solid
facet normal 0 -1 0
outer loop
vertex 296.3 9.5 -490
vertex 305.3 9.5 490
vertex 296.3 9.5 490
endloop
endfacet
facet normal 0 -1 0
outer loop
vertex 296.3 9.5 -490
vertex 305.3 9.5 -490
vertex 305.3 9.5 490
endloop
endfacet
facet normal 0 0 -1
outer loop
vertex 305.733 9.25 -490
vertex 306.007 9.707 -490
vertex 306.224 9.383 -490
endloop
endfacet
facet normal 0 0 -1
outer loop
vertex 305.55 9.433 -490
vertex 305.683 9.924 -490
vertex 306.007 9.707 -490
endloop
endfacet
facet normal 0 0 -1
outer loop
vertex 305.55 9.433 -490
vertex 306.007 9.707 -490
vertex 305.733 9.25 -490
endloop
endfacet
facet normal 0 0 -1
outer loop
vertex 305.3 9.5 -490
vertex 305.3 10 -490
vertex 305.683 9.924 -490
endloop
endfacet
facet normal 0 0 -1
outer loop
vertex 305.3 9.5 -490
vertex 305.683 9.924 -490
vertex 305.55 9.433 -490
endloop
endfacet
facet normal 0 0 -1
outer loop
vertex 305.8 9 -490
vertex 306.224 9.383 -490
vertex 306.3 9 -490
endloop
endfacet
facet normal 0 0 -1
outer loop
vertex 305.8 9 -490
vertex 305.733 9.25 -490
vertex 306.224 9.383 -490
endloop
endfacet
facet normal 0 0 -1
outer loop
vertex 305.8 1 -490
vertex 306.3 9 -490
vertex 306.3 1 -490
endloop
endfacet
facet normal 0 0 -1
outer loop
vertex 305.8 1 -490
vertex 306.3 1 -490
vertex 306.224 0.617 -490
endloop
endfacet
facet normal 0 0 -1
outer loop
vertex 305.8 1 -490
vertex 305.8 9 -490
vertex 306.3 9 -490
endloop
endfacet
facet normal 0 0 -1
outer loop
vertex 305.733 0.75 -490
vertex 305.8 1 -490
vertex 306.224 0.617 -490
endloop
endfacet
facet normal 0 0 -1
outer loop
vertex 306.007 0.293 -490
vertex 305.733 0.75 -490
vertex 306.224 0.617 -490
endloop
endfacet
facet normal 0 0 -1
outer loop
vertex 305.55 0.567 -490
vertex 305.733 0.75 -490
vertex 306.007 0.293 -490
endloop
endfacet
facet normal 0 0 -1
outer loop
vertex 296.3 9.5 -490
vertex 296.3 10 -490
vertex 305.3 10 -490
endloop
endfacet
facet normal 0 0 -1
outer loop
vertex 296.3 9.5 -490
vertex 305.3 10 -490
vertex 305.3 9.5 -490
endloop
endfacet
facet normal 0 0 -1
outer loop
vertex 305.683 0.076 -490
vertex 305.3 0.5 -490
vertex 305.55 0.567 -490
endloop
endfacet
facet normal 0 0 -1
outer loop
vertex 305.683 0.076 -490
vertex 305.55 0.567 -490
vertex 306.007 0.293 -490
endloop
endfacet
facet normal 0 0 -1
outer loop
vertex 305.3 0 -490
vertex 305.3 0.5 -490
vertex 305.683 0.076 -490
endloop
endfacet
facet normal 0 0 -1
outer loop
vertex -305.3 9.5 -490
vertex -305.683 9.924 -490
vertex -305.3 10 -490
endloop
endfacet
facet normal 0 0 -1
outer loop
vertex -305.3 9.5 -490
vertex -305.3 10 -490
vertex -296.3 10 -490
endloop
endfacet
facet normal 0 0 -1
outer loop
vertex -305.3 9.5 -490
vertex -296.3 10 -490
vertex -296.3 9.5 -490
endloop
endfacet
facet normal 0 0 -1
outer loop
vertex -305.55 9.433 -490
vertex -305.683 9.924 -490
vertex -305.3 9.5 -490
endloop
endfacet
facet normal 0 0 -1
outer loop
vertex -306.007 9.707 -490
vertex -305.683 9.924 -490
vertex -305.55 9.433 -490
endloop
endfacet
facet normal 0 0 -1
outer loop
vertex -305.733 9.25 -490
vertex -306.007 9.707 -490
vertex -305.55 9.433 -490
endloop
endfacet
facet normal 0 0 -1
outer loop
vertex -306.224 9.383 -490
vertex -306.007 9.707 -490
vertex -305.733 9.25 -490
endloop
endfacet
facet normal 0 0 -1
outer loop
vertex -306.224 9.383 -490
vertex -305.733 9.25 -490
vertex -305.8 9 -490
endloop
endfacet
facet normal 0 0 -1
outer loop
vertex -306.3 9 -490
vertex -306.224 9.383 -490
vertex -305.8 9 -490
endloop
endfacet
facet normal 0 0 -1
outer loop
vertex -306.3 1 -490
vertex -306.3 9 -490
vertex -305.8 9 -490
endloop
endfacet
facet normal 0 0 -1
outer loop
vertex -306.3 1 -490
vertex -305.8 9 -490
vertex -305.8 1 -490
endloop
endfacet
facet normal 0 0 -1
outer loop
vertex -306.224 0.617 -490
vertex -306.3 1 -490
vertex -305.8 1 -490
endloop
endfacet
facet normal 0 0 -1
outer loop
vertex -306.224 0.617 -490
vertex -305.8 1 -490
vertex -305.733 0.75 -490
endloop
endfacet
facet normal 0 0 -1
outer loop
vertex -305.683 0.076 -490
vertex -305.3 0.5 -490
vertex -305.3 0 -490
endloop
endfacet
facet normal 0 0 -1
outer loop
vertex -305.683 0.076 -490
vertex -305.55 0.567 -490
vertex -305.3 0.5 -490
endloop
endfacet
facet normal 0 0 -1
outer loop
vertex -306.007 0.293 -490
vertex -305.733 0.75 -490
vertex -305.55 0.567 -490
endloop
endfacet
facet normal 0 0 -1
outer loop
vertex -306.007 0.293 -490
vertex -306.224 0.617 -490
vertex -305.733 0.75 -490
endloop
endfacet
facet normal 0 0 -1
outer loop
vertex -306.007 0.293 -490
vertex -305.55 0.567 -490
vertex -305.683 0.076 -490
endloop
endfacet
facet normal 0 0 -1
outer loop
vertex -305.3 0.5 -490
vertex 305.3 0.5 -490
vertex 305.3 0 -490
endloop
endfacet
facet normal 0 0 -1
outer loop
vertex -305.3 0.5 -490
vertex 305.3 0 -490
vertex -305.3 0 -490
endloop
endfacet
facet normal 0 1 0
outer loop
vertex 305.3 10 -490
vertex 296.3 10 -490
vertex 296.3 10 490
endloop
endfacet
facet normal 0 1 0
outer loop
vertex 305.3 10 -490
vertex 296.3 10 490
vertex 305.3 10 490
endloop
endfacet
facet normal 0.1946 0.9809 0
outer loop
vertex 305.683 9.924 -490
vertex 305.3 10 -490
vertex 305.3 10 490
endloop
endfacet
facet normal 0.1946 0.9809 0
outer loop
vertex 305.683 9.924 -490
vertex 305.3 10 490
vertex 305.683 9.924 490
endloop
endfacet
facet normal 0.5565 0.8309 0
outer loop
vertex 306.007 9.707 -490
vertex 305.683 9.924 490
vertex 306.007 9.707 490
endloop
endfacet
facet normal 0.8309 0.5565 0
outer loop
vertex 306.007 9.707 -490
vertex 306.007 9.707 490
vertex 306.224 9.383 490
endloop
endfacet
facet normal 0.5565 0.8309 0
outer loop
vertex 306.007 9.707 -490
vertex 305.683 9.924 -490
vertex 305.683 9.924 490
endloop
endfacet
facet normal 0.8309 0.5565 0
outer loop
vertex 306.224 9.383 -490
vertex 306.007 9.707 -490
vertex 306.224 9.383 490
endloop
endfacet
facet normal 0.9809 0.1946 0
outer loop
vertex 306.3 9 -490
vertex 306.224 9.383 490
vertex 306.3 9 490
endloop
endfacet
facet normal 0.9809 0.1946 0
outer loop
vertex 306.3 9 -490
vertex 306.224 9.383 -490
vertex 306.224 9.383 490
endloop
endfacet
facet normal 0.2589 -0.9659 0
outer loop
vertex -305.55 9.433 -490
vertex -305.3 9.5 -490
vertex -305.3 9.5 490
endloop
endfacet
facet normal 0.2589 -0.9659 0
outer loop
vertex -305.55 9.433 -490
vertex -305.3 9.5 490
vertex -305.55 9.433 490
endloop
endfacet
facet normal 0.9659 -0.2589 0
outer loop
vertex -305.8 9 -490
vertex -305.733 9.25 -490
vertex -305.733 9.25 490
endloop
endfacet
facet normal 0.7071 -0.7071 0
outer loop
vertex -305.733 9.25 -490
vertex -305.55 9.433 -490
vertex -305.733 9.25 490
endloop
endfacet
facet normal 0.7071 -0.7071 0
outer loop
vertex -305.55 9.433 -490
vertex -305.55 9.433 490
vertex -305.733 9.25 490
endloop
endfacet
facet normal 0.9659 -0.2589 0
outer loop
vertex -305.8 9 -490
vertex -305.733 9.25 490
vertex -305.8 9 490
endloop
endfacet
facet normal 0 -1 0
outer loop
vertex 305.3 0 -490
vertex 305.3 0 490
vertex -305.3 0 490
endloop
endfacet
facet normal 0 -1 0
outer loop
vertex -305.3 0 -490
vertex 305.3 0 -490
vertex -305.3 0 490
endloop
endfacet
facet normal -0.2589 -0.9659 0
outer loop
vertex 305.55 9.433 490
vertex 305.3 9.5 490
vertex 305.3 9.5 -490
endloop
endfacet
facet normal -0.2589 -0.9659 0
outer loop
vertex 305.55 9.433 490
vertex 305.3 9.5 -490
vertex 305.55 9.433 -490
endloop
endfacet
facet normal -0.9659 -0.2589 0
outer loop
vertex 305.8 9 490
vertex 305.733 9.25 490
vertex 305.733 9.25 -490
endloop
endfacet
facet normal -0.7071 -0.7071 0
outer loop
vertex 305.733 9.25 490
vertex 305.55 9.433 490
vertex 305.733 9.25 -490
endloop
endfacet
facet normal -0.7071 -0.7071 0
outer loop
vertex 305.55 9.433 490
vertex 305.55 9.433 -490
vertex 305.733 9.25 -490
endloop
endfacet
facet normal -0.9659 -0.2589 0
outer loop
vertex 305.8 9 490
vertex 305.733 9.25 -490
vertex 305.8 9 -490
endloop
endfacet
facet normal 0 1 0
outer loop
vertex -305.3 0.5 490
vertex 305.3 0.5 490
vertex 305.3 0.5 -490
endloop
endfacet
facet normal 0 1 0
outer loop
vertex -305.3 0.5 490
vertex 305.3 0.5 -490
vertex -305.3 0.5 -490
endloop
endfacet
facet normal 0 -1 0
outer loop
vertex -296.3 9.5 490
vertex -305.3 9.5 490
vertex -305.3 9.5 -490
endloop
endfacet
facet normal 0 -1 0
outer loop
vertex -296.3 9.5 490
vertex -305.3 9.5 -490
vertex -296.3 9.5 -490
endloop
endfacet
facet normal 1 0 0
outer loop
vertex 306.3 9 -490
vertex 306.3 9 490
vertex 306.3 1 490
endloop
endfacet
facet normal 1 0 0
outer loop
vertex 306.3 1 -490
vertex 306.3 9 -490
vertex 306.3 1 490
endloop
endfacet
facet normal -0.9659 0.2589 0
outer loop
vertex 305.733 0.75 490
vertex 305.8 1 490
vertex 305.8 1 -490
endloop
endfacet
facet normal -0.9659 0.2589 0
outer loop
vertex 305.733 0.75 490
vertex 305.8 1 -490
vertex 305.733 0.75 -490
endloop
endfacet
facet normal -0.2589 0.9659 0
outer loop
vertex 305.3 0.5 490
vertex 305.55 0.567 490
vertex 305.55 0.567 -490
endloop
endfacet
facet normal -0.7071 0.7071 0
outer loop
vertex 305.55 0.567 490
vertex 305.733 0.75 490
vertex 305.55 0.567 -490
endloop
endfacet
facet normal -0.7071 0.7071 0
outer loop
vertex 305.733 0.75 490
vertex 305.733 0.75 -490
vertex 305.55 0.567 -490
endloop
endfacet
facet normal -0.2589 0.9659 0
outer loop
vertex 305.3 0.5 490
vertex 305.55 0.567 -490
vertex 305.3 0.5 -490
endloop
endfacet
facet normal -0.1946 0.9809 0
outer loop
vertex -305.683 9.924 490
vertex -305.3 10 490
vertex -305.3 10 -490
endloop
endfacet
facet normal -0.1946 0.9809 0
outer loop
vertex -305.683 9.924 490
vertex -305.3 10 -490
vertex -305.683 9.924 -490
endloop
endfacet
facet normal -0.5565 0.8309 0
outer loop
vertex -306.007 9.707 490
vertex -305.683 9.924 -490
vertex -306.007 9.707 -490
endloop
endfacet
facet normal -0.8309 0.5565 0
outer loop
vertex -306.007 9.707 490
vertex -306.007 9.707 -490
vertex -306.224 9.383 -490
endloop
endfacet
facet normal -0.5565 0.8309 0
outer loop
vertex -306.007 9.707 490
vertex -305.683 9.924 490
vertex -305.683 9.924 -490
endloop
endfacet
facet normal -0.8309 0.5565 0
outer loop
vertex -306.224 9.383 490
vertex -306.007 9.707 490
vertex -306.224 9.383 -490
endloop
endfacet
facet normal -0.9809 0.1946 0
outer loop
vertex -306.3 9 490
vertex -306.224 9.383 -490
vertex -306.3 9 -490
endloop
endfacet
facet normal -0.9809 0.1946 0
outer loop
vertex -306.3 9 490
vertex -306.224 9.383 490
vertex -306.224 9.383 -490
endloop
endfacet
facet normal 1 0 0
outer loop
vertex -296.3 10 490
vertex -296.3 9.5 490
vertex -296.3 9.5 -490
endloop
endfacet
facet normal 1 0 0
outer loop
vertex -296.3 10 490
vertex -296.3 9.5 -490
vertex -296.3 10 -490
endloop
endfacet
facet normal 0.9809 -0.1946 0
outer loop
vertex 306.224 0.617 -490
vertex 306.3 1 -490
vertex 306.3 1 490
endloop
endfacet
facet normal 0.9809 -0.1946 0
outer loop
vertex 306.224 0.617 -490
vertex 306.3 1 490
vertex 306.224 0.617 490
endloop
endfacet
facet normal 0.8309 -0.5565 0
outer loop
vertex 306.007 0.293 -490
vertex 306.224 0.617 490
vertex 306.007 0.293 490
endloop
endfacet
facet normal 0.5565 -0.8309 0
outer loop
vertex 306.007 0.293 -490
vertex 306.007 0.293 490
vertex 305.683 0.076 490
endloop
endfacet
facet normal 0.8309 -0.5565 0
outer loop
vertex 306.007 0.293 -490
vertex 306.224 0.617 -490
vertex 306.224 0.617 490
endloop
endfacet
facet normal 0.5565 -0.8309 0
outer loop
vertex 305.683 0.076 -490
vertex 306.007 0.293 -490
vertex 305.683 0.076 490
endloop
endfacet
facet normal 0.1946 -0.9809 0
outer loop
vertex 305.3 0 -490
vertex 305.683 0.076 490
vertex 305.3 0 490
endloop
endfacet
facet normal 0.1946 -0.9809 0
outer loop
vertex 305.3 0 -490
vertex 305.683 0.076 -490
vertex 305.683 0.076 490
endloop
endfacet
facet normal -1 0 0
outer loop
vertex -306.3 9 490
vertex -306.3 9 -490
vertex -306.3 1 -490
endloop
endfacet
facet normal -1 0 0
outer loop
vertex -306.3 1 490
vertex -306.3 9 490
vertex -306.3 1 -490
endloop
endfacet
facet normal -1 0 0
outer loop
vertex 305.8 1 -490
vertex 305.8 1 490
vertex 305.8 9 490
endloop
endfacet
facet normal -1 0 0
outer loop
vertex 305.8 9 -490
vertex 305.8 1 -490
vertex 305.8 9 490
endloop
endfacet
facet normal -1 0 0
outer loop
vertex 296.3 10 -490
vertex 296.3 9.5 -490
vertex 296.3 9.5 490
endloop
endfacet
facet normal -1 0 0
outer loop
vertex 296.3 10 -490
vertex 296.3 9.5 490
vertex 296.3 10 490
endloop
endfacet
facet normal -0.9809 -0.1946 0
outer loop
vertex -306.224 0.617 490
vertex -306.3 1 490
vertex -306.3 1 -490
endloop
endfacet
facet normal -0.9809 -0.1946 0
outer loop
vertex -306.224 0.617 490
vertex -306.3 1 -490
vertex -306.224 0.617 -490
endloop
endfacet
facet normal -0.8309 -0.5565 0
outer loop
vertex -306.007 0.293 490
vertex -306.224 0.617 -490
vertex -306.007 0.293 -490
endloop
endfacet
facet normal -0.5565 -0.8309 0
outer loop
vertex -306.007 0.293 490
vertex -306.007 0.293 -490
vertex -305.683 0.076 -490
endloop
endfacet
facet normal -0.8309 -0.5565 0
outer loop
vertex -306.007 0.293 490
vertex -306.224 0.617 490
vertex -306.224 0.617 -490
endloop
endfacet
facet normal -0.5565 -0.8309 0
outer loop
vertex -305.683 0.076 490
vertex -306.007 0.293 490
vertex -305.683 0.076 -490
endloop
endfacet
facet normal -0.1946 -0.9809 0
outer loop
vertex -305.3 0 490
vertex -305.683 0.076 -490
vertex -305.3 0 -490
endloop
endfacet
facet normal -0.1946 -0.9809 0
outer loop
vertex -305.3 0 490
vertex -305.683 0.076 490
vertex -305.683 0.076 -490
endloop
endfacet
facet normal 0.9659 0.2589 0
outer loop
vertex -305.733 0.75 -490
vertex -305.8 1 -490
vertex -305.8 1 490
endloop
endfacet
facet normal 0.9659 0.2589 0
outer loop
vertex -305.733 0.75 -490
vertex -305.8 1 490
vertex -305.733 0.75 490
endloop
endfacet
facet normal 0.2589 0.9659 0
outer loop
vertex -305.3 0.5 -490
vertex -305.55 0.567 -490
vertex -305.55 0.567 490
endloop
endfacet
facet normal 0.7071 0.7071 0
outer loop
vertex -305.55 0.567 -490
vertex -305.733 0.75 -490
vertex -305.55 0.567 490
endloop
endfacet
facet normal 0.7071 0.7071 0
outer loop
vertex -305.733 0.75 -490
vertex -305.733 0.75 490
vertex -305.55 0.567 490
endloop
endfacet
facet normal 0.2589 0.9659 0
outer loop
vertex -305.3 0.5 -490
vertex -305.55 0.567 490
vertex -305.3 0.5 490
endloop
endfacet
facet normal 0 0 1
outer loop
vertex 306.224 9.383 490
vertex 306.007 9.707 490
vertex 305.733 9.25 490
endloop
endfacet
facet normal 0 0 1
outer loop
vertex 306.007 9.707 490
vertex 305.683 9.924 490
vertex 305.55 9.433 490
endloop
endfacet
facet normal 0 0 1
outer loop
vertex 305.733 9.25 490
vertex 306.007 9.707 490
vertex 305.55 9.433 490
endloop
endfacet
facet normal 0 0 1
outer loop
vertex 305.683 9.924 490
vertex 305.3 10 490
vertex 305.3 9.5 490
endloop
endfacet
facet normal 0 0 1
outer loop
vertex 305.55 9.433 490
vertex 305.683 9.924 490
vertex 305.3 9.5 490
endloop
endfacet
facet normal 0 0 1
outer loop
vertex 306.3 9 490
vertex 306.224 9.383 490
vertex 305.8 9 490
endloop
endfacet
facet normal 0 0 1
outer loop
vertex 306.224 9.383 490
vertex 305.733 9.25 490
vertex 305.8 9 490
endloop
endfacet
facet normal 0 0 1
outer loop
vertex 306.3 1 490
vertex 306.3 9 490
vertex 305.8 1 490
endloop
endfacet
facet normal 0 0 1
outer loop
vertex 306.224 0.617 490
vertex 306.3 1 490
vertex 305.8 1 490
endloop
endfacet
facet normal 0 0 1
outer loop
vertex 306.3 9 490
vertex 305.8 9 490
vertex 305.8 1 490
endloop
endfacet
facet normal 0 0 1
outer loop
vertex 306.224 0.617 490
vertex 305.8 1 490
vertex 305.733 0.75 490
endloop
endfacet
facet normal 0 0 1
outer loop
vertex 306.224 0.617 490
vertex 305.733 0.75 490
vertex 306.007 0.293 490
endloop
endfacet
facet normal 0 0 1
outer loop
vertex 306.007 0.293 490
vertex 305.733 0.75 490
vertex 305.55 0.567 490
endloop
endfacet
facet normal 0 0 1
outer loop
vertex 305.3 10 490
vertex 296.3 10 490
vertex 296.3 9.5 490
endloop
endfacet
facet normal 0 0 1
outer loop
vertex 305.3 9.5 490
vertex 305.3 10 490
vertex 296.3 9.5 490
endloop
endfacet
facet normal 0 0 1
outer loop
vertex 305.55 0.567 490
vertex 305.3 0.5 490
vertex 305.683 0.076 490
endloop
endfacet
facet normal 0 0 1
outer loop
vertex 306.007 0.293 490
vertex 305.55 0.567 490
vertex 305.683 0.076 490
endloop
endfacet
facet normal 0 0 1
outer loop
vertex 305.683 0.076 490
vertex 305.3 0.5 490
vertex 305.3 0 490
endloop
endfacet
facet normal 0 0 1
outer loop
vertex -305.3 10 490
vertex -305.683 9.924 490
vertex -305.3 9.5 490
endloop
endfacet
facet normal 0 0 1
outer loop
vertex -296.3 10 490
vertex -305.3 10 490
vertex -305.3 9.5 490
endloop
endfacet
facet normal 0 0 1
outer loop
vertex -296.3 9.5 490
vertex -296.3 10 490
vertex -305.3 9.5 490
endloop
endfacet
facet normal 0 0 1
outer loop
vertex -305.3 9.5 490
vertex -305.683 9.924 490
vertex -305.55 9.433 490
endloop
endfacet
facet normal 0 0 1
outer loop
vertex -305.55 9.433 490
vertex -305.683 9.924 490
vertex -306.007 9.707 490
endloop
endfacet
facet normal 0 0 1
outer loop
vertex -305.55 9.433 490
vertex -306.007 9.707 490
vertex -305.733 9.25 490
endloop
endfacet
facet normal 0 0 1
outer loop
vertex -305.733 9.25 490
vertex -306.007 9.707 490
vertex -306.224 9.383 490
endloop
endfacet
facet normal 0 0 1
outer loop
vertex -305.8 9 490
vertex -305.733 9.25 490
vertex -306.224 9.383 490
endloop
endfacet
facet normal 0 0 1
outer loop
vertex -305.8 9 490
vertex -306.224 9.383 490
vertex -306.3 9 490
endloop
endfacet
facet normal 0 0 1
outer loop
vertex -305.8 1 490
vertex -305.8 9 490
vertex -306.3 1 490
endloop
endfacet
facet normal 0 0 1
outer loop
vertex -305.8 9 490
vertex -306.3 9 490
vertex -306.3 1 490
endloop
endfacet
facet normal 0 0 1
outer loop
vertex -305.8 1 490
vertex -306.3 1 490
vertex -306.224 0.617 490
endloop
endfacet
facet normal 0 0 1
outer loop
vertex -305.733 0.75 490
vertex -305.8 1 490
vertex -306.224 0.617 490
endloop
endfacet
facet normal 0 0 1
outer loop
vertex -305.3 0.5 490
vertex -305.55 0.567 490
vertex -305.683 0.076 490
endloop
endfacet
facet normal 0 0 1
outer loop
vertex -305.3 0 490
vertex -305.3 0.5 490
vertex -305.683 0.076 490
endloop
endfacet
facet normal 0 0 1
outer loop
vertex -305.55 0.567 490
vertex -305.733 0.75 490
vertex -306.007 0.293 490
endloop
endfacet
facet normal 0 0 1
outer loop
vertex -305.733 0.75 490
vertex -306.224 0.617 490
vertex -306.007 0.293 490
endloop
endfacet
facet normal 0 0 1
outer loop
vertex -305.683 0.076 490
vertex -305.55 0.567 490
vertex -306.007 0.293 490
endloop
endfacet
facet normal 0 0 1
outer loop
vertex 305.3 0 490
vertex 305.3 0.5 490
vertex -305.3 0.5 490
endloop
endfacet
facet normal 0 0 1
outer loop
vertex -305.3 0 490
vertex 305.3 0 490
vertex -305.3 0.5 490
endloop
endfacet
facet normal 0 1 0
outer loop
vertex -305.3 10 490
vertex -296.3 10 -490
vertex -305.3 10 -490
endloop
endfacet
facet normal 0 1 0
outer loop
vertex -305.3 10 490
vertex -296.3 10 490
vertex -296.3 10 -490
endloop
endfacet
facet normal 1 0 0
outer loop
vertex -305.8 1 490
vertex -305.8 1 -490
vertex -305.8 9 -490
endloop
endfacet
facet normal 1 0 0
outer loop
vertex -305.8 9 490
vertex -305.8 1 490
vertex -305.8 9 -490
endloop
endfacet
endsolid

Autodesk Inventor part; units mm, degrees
ref_plane "YZ Plane" through (0, 0, 0) normal (1, 0, 0) x (0, 1, 0)
ref_plane "XZ Plane" through (0, 0, 0) normal (0, 1, 0) x (-1, 0, 0)
ref_plane "XY Plane" through (0, 0, 0) normal (0, 0, 1) x (1, 0, 0)
sketch "Sketch6" plane through (0, 0, 0) normal (0, 1, 0) x (-1, 0, 0)
  line L0 (306.3, -490) -> (-306.3, -490)
  line L1 (-306.3, -490) -> (-306.3, 490)
  line L2 (-306.3, 490) -> (306.3, 490)
  line L3 (306.3, 490) -> (306.3, -490)
  line L4 (306.3, -490) -> (-306.3, 490) construction
  line L5 (-306.3, -490) -> (306.3, 490) construction
  point P0 (0, 0)
  dimension "d52" = 612.6
  dimension "d53" = 980
extrude "Plate2" add sketch "Sketch6" along normal blind 0.5
sketch "Sketch11" plane through (-305.8, 0, 490) normal (-1, 0, 0) x (0, -1, 0)
  line L0 (0, -980) -> (0, 0)
  line L1 (0, 0) -> (-10, 0)
  line L2 (-10, 0) -> (-10, -980)
  line L3 (-10, -980) -> (0, -980)
edge flange "Flange2" height 10 angle 90 thickness 0.5 bend radius 0.5 thickness toward (-1, 0, 0) relief tear relief width 0.5 relief depth 0.25 edges at (-306.3, 0.5, 0) wall of the first edge with corners at (-305.8, 0, -490) (-305.8, 0, 490) (-305.8, 10, 490) (-305.8, 10, -490)
bend "Bend3"
corner "Corner3"
sketch "Sketch12" plane through (-306.3, 9.5, 490) normal (0, 1, 0) x (-1, 0, 0)
  line L0 (0, -980) -> (0, 0)
  line L1 (0, 0) -> (-10, 0)
  line L2 (-10, 0) -> (-10, -980)
  line L3 (-10, -980) -> (0, -980)
edge flange "Flange3" height 10 angle 90 thickness 0.5 bend radius 0.5 thickness toward (0, 1, 0) relief tear relief width 0.5 relief depth 0.25 edges at (-305.8, 10, 0) wall of the first edge with corners at (-306.3, 9.5, -490) (-306.3, 9.5, 490) (-296.3, 9.5, 490) (-296.3, 9.5, -490)
bend "Bend4"
corner "Corner4"
sketch "Sketch13" plane through (305.8, 0, -490) normal (1, 0, 0) x (0, 1, 0)
  line L0 (0, 980) -> (0, 0)
  line L1 (0, 0) -> (10, 0)
  line L2 (10, 0) -> (10, 980)
  line L3 (10, 980) -> (0, 980)
edge flange "Flange4" height 10 angle 90 thickness 0.5 bend radius 0.5 thickness toward (1, 0, 0) relief tear relief width 0.5 relief depth 0.25 edges at (306.3, 0.5, 0) wall of the first edge with corners at (305.8, 0, 490) (305.8, 0, -490) (305.8, 10, -490) (305.8, 10, 490)
bend "Bend5"
corner "Corner5"
sketch "Sketch14" plane through (306.3, 9.5, -490) normal (0, 1, 0) x (-1, 0, 0)
  line L0 (0, 980) -> (0, 0)
  line L1 (0, 0) -> (10, 0)
  line L2 (10, 0) -> (10, 980)
  line L3 (10, 980) -> (0, 980)
edge flange "Flange5" height 10 angle 90 thickness 0.5 bend radius 0.5 thickness toward (0, 1, 0) relief tear relief width 0.5 relief depth 0.25 edges at (305.8, 10, 0) wall of the first edge with corners at (306.3, 9.5, 490) (306.3, 9.5, -490) (296.3, 9.5, -490) (296.3, 9.5, 490)
bend "Bend6"
corner "Corner6"
equation "\"d52\" = ЖАБРЫ_базовая_ширина - 3 * ЖАБРЫ_шаг_листов"
equation "\"d53\" = ЖАБРЫ_базовая_длина_кор_лист"
equation "\"d54\" = Thickness"
equation "\"d84\" = BendReliefWidth"
equation "\"d85\" = BendReliefDepth"
equation "\"d86\" = MinimumRemnant"
equation "\"d87\" = TransitionRadius"
equation "\"d90\" = BendRadius"
equation "\"d91\" = CornerReliefSize"
equation "\"d92\" = GapSize"
equation "\"d93\" = JacobiRadiusSize"
equation "\"d94\" = BendReliefWidth"
equation "\"d95\" = BendReliefDepth"
equation "\"d96\" = MinimumRemnant"
equation "\"d97\" = TransitionRadius"
equation "\"d100\" = BendRadius"
equation "\"d101\" = CornerReliefSize"
equation "\"d102\" = GapSize"
equation "\"d103\" = JacobiRadiusSize"
equation "\"d104\" = BendReliefWidth"
equation "\"d105\" = BendReliefDepth"
equation "\"d106\" = MinimumRemnant"
equation "\"d107\" = TransitionRadius"
equation "\"d110\" = BendRadius"
equation "\"d111\" = CornerReliefSize"
equation "\"d112\" = GapSize"
equation "\"d113\" = JacobiRadiusSize"
equation "\"d114\" = BendReliefWidth"
equation "\"d115\" = BendReliefDepth"
equation "\"d116\" = MinimumRemnant"
equation "\"d117\" = TransitionRadius"
equation "\"d120\" = BendRadius"
equation "\"d121\" = CornerReliefSize"
equation "\"d122\" = GapSize"
equation "\"d123\" = JacobiRadiusSize"
equation "\"BendRadius\" = Thickness"
equation "\"BendReliefWidth\" = Thickness"
equation "\"BendReliefDepth\" = 0.5 * Thickness"
equation "\"CornerReliefSize\" = 4 * Thickness"
equation "\"MinimumRemnant\" = 2 * Thickness"
equation "\"TransitionRadius\" = BendRadius"
equation "\"JacobiRadiusSize\" = BendRadius"
equation "\"GapSize\" = Thickness"
equation "\"ЖАБРЫ_базовая_ширина\" = 915"
equation "\"ЖАБРЫ_шаг_листов\" = 100.8"
equation "\"ЖАБРЫ_базовая_длина_кор_лист\" = 980"
equation "\"Thickness\" = 0.5"
properties part number "MSC 807 sheet gills" material "Stainless Steel"
